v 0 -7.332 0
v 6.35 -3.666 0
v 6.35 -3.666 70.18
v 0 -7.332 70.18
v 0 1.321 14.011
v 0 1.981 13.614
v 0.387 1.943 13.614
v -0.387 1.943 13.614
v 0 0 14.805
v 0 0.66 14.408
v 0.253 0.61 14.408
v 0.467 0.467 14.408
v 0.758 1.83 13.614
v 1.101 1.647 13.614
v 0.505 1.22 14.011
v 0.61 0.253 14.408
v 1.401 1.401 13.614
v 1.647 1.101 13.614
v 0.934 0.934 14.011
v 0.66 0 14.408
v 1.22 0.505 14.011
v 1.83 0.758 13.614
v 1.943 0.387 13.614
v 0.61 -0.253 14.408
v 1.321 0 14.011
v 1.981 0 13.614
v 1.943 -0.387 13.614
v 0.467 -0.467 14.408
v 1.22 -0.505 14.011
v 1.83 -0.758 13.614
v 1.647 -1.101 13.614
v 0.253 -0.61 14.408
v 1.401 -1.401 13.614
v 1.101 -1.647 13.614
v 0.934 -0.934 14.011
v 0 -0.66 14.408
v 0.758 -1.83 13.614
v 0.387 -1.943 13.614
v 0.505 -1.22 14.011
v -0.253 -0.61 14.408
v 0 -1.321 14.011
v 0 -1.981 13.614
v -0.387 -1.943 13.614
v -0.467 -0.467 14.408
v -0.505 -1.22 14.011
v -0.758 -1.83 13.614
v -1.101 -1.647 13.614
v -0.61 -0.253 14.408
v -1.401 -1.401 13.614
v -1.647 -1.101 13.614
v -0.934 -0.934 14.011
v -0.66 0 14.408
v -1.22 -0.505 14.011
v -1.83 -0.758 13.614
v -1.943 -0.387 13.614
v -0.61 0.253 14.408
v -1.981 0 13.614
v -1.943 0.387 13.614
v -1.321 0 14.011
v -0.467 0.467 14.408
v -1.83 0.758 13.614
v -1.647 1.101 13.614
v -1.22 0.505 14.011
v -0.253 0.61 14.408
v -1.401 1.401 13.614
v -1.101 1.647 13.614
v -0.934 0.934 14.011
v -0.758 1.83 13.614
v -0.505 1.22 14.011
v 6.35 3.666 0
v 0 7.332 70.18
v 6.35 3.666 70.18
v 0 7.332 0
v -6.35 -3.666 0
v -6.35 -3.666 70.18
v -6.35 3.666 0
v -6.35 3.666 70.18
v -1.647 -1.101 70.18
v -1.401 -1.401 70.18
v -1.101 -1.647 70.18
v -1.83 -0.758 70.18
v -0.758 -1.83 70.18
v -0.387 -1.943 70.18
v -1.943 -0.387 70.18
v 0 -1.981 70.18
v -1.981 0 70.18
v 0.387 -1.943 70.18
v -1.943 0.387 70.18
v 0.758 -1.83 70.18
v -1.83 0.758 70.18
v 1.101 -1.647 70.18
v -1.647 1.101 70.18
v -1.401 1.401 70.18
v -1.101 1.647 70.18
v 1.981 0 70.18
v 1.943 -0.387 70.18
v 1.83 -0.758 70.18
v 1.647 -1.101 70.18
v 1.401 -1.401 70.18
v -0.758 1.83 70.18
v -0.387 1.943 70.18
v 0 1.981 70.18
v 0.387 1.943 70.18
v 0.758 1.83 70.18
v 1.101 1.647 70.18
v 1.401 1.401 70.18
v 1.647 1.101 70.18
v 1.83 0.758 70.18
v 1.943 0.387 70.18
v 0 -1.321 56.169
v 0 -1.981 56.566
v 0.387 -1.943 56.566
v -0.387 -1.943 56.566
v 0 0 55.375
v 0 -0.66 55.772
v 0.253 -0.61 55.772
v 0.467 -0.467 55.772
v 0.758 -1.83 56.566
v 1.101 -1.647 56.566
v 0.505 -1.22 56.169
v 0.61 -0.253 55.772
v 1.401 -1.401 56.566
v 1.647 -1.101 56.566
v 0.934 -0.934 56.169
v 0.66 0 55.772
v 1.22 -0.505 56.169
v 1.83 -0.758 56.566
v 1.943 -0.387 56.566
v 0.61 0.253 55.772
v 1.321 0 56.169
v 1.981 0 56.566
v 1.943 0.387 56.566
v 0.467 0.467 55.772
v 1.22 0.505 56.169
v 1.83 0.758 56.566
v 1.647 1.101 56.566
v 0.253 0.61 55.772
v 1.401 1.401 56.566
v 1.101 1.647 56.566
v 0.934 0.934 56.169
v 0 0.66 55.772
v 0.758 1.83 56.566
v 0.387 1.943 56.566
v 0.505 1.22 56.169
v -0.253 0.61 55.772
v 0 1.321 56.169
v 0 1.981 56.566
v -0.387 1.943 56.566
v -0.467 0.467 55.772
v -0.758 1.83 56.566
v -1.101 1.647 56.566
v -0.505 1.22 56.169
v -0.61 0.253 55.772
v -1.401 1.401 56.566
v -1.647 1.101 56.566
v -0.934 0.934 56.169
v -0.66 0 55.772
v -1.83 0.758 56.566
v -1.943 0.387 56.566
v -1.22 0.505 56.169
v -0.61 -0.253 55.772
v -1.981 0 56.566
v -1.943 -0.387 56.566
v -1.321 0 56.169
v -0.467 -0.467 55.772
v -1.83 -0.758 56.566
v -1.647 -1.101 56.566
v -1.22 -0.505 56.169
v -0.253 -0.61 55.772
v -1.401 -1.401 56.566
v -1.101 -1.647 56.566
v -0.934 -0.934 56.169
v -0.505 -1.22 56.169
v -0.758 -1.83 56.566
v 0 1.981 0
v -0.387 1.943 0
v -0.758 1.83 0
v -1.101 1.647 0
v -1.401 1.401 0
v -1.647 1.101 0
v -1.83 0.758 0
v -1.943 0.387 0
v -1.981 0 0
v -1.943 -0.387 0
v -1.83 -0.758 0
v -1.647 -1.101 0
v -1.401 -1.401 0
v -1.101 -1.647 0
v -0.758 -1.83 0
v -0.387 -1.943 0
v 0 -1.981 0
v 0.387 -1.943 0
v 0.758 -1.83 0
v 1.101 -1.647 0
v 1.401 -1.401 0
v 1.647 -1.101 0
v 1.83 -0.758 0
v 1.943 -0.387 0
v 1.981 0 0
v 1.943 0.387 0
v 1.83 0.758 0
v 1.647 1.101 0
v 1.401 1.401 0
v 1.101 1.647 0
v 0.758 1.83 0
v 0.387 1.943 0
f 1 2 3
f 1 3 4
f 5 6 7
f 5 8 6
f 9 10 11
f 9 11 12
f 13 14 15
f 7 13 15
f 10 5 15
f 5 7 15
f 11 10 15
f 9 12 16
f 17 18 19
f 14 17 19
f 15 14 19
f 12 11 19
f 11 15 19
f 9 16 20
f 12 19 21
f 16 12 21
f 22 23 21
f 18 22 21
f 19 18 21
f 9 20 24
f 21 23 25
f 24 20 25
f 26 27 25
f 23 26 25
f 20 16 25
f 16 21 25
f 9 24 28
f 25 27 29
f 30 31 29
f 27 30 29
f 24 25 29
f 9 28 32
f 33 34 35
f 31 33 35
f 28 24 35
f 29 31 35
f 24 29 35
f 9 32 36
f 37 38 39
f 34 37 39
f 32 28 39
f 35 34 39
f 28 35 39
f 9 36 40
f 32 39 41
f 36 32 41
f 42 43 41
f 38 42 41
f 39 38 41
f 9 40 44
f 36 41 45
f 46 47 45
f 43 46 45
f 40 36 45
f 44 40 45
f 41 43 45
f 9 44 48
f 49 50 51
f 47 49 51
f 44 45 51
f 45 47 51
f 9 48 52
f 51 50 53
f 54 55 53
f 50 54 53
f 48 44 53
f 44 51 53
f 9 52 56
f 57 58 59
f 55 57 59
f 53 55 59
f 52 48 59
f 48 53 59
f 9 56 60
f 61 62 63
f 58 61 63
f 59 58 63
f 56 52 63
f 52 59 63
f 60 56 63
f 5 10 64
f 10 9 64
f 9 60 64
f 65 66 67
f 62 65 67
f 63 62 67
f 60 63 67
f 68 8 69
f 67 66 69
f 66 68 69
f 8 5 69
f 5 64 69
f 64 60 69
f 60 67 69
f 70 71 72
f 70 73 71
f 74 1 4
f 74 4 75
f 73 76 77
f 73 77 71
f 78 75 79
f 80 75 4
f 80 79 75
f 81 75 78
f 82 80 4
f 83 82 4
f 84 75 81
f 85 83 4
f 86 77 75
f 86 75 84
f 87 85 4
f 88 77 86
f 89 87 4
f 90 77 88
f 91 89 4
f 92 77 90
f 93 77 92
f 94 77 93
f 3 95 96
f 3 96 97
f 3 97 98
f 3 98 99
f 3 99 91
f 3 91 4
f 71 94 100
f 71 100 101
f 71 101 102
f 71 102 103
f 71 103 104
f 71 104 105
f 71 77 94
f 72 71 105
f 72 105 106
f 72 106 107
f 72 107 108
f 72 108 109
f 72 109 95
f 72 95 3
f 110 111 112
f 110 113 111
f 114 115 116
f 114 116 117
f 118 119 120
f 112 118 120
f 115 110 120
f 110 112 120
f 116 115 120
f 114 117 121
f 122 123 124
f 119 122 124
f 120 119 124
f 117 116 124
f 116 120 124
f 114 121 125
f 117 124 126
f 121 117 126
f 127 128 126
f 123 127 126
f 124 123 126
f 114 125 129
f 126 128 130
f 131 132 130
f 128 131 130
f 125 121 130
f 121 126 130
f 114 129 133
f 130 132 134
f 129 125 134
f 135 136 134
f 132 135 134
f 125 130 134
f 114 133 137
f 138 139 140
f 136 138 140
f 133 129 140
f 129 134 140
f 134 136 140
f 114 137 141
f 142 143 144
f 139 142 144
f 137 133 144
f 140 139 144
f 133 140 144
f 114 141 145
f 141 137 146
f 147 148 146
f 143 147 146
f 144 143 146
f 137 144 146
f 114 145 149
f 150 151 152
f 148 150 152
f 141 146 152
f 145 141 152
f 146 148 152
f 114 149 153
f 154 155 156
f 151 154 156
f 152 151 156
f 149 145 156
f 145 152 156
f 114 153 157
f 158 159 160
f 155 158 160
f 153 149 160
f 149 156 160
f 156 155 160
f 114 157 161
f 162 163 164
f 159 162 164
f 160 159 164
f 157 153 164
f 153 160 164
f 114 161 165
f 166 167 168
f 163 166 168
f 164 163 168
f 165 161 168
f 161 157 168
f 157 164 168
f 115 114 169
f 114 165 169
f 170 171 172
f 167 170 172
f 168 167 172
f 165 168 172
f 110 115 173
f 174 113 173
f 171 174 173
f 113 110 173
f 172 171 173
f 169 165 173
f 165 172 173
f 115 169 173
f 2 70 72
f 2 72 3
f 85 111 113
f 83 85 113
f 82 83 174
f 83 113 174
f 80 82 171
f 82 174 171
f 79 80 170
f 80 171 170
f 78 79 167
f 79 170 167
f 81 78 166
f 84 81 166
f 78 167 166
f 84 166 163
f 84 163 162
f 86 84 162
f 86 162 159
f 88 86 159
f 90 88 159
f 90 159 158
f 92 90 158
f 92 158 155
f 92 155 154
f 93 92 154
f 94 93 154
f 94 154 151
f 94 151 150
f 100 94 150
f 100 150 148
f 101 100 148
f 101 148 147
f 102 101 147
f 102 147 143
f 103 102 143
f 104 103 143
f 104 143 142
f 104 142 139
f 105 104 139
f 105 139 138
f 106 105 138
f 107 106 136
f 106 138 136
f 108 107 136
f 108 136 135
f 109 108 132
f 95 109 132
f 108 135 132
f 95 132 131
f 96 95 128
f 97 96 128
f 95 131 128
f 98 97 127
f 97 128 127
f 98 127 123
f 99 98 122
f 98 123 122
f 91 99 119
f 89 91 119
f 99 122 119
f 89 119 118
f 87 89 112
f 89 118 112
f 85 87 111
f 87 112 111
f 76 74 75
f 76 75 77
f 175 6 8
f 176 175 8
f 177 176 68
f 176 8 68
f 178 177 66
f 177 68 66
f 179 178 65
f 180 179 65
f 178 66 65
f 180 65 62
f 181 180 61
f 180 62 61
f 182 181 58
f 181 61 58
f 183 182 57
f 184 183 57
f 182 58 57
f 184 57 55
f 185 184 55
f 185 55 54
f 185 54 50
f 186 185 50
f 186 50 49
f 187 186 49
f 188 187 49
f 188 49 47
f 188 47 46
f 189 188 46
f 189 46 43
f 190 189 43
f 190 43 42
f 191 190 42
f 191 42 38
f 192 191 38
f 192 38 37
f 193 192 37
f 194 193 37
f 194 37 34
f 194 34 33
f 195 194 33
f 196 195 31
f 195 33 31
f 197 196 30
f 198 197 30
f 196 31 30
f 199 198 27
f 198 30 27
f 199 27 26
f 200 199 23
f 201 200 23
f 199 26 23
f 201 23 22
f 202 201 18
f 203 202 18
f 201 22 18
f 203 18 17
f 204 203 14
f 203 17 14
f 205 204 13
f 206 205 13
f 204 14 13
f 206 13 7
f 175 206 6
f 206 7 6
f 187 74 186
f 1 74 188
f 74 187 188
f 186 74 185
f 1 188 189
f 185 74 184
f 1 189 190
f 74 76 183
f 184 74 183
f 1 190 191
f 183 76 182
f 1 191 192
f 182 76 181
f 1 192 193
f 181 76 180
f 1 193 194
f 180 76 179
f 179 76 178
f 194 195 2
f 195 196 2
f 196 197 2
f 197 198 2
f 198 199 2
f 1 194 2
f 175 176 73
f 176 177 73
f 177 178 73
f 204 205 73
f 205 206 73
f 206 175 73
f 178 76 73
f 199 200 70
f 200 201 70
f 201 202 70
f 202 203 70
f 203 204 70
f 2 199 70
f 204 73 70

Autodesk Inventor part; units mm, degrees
ref_plane "YZ Plane" through (0, 0, 0) normal (1, 0, 0) x (0, 1, 0)
ref_plane "XZ Plane" through (0, 0, 0) normal (0, 1, 0) x (-1, 0, 0)
ref_plane "XY Plane" through (0, 0, 0) normal (0, 0, 1) x (1, 0, 0)
sketch "Sketch1" plane through (0, 0, 0) normal (0, 0, 1) x (1, 0, 0)
  line L0 (-6.35, -3.6662) -> (-6.35, 3.6662)
  line L1 (-6.35, 3.6662) -> (0, 7.3323)
  line L2 (0, 7.3323) -> (6.35, 3.6662)
  line L3 (6.35, 3.6662) -> (6.35, -3.6662)
  line L4 (6.35, -3.6662) -> (0, -7.3323)
  line L5 (0, -7.3323) -> (-6.35, -3.6662)
  point P0 (0, 0)
  point P1 (0, 0)
  dimension "d0" = 12.7
extrude "Extrusion1" add sketch "Sketch1" along normal blind 70.1802
sketch "Sketch2" plane through (0, 0, 70.1802) normal (0, 0, 1) x (1, 0, 0)
  point P0 (0, 0)
  point P1 (0, 0)
hole "Hole1" at (0, 0, 70.1802) direction (0, 0, -1) diameter 3.9624 depth 13.6144 tip angle 118 thread size "10-32 UNF" class "2B" standard "ANSI Unified Screw Threads"
sketch "Sketch3" plane through (0, 0, 0) normal (0, 0, -1) x (-1, 0, 0)
  circle A0 centre (0, 0) radius 1.9812 projected
hole "Hole2" at (0, 0, 0) direction (0, 0, 1) diameter 3.9624 depth 13.6144 tip angle 118 thread size "10-32 UNF" class "2B" standard "ANSI Unified Screw Threads"
properties part number "STOCK,HEX,SHAFT,TURRET,DRIVE" material "Aluminum 6061"
